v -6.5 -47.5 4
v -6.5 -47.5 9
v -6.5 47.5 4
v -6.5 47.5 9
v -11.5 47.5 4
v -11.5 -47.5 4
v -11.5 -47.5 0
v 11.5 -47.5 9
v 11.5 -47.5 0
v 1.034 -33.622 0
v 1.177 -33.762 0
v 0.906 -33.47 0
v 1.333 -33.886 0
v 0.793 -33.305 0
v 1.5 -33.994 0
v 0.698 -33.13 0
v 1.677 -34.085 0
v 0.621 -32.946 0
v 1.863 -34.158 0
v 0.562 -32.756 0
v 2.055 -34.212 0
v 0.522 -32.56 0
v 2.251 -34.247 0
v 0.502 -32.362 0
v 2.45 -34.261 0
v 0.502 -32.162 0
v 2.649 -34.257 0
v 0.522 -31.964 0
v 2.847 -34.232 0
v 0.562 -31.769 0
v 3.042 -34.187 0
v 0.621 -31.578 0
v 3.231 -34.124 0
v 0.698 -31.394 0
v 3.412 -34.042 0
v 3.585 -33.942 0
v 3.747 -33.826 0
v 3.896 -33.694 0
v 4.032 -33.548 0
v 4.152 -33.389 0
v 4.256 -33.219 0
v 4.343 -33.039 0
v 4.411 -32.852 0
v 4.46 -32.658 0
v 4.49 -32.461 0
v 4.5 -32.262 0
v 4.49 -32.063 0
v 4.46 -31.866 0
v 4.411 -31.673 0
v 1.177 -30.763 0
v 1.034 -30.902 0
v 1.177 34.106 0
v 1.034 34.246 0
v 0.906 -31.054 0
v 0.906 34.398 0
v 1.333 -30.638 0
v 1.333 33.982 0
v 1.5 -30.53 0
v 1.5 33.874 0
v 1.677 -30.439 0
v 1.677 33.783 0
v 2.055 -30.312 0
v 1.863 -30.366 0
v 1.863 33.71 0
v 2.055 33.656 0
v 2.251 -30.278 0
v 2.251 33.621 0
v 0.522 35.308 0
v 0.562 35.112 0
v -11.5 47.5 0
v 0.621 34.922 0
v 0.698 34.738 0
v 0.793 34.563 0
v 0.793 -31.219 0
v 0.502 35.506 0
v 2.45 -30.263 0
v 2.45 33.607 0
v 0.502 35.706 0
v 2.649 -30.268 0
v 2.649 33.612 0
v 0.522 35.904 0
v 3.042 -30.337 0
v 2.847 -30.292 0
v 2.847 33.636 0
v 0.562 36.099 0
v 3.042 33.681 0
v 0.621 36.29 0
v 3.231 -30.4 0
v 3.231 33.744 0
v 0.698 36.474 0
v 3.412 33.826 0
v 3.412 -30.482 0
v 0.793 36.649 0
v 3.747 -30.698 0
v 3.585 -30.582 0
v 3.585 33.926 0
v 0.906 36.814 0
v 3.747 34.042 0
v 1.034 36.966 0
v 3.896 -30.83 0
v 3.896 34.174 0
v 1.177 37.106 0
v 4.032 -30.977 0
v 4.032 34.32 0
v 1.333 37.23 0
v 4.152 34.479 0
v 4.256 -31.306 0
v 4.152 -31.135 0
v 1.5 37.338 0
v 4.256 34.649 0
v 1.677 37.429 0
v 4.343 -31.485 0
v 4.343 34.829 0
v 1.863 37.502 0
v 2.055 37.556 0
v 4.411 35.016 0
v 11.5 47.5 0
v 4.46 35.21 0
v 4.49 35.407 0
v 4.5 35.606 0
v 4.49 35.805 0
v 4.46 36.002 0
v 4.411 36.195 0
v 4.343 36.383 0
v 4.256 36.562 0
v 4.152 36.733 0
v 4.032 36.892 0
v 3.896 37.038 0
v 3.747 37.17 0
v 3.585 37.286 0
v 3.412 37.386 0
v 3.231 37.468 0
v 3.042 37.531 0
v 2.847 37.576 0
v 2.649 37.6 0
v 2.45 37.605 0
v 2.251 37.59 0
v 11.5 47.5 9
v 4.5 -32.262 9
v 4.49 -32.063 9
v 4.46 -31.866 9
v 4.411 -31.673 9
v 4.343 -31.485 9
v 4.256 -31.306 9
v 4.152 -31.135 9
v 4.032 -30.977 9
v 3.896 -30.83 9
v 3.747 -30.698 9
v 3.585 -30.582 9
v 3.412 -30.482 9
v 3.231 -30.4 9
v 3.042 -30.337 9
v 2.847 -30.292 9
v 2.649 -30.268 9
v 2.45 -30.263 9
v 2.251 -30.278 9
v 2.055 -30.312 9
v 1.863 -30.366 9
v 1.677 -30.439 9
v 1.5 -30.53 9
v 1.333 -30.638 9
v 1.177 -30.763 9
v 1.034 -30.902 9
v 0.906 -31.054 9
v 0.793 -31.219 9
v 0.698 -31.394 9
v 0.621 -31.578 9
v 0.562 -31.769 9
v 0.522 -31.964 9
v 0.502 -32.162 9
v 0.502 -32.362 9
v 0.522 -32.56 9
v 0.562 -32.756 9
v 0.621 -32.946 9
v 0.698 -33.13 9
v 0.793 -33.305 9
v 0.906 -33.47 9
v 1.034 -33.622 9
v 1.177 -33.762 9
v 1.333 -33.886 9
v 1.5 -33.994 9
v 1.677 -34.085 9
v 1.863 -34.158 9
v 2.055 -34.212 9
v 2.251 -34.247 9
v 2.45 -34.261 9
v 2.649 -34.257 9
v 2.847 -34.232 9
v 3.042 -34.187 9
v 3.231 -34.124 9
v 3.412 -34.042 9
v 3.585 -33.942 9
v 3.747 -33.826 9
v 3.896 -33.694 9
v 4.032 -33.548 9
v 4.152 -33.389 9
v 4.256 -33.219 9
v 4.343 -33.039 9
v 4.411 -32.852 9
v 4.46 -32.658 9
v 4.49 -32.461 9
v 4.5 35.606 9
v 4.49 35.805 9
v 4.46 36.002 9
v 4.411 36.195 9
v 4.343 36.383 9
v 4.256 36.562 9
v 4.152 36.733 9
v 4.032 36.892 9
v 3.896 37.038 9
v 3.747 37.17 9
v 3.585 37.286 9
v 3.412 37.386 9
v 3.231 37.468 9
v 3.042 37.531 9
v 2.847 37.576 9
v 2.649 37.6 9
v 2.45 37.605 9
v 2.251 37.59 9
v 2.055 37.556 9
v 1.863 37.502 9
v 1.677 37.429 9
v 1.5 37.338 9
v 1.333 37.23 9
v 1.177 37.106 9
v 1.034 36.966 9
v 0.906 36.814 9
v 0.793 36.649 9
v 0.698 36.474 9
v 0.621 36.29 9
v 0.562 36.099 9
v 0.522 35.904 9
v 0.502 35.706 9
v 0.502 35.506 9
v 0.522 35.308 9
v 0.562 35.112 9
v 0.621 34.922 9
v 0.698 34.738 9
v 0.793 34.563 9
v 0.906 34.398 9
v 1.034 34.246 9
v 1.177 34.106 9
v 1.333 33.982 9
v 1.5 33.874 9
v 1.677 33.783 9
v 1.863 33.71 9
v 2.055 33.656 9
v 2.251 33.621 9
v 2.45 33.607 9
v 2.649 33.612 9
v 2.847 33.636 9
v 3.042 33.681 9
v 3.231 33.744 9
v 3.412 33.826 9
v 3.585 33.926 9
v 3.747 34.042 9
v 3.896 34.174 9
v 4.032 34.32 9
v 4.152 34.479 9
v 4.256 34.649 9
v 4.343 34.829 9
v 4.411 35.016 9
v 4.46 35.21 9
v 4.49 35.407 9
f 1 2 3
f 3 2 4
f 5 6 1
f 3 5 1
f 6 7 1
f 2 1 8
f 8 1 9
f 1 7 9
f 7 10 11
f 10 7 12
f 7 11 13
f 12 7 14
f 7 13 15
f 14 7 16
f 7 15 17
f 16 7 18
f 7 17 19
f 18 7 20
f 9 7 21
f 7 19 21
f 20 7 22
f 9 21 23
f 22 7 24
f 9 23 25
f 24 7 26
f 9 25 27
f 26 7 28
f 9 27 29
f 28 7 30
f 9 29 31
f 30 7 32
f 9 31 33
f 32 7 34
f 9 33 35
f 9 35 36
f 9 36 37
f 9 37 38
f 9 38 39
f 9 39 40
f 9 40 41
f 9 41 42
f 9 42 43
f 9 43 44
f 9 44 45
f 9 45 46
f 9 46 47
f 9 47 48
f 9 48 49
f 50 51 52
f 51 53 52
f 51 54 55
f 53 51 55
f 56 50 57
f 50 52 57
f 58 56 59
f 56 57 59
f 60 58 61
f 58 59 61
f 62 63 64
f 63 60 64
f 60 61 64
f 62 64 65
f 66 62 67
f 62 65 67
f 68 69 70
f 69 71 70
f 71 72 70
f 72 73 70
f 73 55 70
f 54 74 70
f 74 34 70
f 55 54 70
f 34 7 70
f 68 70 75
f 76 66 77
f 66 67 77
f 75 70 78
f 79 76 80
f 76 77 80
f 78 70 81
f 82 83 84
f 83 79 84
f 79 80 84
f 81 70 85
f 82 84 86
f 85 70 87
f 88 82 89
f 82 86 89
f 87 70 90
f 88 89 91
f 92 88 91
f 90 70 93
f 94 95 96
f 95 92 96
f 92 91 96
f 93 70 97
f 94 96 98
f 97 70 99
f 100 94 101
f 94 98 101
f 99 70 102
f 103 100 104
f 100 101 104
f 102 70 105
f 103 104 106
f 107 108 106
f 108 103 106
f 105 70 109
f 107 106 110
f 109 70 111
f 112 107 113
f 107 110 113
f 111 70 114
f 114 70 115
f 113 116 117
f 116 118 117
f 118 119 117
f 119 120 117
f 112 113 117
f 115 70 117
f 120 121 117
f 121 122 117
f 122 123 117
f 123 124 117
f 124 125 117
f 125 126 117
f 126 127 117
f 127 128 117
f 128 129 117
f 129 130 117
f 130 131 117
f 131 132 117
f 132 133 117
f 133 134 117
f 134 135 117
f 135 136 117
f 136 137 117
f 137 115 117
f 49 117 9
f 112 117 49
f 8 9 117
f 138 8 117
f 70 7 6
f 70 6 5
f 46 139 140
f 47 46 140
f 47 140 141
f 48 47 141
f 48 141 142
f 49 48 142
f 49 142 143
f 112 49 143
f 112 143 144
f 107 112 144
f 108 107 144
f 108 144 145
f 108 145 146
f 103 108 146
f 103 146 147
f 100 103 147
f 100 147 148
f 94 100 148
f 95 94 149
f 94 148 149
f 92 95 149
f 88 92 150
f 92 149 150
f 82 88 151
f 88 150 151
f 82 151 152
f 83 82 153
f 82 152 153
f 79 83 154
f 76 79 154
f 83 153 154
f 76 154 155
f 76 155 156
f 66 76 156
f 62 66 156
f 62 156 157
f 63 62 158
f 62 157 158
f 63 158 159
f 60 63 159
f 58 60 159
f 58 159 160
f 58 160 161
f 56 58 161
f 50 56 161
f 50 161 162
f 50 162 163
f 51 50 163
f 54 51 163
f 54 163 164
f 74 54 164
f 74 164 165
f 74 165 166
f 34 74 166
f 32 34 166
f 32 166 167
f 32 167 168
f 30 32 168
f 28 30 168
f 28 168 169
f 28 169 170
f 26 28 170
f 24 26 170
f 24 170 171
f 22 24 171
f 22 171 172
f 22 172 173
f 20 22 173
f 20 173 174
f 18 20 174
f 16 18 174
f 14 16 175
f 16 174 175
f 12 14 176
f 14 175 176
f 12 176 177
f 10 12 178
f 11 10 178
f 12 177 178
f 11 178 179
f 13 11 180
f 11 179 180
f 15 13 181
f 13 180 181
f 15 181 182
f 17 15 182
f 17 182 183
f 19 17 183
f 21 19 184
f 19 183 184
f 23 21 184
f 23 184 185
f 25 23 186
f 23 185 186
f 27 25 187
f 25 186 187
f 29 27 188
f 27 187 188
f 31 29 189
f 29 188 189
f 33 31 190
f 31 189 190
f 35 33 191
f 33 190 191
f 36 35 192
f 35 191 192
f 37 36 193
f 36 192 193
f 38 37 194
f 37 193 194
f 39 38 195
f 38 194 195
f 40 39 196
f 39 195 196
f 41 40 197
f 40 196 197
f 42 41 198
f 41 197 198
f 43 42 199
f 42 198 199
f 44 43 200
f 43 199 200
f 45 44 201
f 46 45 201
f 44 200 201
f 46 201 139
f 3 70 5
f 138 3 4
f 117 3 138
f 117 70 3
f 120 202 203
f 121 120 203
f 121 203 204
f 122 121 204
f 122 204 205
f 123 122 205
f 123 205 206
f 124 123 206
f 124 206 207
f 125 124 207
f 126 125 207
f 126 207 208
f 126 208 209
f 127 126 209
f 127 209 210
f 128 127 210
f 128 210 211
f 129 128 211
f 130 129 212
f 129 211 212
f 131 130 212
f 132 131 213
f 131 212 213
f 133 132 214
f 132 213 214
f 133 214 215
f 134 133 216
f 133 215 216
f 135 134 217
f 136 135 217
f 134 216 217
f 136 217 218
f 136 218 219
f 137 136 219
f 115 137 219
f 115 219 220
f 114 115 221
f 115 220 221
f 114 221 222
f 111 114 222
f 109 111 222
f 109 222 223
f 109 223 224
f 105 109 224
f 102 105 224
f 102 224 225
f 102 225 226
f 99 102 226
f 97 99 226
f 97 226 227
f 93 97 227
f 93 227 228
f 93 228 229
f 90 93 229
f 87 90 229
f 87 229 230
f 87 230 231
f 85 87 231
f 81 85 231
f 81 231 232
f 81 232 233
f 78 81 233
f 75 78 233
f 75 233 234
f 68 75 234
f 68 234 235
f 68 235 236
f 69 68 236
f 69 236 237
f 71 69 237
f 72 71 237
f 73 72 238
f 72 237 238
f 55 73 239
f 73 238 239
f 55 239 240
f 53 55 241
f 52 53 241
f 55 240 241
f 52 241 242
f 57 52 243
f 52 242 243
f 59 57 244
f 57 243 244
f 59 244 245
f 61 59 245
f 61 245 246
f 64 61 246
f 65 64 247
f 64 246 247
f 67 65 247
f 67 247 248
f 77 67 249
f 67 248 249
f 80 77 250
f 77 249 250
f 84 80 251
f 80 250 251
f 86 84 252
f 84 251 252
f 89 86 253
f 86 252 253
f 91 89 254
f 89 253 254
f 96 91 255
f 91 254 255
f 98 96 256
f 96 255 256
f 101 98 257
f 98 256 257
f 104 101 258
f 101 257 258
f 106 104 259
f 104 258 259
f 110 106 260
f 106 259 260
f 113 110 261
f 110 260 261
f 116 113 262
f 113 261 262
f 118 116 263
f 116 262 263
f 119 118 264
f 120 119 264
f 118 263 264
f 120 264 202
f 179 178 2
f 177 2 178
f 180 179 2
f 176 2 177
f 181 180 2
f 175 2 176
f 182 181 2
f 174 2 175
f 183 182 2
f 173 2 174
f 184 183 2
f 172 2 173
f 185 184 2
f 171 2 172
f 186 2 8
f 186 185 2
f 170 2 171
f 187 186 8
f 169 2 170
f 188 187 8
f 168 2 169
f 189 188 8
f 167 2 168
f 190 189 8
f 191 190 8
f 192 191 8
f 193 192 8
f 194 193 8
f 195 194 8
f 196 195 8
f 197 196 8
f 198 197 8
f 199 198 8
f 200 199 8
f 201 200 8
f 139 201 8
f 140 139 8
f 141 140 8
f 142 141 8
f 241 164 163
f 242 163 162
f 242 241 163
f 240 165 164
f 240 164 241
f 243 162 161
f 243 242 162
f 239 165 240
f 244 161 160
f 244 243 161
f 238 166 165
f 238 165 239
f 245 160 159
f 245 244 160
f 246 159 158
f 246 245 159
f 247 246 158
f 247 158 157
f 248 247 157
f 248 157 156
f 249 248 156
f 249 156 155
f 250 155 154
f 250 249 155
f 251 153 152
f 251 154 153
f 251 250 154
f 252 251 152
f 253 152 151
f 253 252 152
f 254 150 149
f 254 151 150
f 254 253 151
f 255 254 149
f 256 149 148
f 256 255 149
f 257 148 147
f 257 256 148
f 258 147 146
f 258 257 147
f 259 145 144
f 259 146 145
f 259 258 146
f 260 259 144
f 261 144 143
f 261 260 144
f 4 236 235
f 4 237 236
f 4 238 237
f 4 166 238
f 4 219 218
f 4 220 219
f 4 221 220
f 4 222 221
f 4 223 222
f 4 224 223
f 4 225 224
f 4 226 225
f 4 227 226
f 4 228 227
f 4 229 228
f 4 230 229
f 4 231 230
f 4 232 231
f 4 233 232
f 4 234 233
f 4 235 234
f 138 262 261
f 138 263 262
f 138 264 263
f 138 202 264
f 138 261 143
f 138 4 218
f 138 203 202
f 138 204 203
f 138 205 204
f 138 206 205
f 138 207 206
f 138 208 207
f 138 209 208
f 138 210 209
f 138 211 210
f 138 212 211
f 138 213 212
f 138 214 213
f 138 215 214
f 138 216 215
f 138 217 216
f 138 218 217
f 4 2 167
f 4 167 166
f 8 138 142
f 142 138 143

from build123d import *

# Parameters (mm, degrees)
F0_W     = 23
F0_H     = 95
F1_DEPTH = 9
F2_W     = 5
F2_H     = 95
F3_DEPTH = 5
F4_R     = 2
F5_DEPTH = 12.446


with BuildPart() as f1:
    # F0 (on Top) → F1 (new body)
    with BuildSketch(Plane.XY):
        Rectangle(F0_W, F0_H)
    extrude(amount=F1_DEPTH)

    # F2 (on face) → F3 (cut)
    with BuildSketch(Plane.XY.offset(9)):
        with Locations((-9, 0)):
            Rectangle(F2_W, F2_H)
    extrude(amount=-F3_DEPTH, mode=Mode.SUBTRACT)

    # F4 (on face) → F5 (cut)
    with BuildSketch(Plane.XY.offset(9)):
        with Locations((2.5, 35.605948)):
            Circle(F4_R)
        with Locations((2.5, -32.262102)):
            Circle(F4_R)
    extrude(amount=-F5_DEPTH, mode=Mode.SUBTRACT)


solid = f1.part
